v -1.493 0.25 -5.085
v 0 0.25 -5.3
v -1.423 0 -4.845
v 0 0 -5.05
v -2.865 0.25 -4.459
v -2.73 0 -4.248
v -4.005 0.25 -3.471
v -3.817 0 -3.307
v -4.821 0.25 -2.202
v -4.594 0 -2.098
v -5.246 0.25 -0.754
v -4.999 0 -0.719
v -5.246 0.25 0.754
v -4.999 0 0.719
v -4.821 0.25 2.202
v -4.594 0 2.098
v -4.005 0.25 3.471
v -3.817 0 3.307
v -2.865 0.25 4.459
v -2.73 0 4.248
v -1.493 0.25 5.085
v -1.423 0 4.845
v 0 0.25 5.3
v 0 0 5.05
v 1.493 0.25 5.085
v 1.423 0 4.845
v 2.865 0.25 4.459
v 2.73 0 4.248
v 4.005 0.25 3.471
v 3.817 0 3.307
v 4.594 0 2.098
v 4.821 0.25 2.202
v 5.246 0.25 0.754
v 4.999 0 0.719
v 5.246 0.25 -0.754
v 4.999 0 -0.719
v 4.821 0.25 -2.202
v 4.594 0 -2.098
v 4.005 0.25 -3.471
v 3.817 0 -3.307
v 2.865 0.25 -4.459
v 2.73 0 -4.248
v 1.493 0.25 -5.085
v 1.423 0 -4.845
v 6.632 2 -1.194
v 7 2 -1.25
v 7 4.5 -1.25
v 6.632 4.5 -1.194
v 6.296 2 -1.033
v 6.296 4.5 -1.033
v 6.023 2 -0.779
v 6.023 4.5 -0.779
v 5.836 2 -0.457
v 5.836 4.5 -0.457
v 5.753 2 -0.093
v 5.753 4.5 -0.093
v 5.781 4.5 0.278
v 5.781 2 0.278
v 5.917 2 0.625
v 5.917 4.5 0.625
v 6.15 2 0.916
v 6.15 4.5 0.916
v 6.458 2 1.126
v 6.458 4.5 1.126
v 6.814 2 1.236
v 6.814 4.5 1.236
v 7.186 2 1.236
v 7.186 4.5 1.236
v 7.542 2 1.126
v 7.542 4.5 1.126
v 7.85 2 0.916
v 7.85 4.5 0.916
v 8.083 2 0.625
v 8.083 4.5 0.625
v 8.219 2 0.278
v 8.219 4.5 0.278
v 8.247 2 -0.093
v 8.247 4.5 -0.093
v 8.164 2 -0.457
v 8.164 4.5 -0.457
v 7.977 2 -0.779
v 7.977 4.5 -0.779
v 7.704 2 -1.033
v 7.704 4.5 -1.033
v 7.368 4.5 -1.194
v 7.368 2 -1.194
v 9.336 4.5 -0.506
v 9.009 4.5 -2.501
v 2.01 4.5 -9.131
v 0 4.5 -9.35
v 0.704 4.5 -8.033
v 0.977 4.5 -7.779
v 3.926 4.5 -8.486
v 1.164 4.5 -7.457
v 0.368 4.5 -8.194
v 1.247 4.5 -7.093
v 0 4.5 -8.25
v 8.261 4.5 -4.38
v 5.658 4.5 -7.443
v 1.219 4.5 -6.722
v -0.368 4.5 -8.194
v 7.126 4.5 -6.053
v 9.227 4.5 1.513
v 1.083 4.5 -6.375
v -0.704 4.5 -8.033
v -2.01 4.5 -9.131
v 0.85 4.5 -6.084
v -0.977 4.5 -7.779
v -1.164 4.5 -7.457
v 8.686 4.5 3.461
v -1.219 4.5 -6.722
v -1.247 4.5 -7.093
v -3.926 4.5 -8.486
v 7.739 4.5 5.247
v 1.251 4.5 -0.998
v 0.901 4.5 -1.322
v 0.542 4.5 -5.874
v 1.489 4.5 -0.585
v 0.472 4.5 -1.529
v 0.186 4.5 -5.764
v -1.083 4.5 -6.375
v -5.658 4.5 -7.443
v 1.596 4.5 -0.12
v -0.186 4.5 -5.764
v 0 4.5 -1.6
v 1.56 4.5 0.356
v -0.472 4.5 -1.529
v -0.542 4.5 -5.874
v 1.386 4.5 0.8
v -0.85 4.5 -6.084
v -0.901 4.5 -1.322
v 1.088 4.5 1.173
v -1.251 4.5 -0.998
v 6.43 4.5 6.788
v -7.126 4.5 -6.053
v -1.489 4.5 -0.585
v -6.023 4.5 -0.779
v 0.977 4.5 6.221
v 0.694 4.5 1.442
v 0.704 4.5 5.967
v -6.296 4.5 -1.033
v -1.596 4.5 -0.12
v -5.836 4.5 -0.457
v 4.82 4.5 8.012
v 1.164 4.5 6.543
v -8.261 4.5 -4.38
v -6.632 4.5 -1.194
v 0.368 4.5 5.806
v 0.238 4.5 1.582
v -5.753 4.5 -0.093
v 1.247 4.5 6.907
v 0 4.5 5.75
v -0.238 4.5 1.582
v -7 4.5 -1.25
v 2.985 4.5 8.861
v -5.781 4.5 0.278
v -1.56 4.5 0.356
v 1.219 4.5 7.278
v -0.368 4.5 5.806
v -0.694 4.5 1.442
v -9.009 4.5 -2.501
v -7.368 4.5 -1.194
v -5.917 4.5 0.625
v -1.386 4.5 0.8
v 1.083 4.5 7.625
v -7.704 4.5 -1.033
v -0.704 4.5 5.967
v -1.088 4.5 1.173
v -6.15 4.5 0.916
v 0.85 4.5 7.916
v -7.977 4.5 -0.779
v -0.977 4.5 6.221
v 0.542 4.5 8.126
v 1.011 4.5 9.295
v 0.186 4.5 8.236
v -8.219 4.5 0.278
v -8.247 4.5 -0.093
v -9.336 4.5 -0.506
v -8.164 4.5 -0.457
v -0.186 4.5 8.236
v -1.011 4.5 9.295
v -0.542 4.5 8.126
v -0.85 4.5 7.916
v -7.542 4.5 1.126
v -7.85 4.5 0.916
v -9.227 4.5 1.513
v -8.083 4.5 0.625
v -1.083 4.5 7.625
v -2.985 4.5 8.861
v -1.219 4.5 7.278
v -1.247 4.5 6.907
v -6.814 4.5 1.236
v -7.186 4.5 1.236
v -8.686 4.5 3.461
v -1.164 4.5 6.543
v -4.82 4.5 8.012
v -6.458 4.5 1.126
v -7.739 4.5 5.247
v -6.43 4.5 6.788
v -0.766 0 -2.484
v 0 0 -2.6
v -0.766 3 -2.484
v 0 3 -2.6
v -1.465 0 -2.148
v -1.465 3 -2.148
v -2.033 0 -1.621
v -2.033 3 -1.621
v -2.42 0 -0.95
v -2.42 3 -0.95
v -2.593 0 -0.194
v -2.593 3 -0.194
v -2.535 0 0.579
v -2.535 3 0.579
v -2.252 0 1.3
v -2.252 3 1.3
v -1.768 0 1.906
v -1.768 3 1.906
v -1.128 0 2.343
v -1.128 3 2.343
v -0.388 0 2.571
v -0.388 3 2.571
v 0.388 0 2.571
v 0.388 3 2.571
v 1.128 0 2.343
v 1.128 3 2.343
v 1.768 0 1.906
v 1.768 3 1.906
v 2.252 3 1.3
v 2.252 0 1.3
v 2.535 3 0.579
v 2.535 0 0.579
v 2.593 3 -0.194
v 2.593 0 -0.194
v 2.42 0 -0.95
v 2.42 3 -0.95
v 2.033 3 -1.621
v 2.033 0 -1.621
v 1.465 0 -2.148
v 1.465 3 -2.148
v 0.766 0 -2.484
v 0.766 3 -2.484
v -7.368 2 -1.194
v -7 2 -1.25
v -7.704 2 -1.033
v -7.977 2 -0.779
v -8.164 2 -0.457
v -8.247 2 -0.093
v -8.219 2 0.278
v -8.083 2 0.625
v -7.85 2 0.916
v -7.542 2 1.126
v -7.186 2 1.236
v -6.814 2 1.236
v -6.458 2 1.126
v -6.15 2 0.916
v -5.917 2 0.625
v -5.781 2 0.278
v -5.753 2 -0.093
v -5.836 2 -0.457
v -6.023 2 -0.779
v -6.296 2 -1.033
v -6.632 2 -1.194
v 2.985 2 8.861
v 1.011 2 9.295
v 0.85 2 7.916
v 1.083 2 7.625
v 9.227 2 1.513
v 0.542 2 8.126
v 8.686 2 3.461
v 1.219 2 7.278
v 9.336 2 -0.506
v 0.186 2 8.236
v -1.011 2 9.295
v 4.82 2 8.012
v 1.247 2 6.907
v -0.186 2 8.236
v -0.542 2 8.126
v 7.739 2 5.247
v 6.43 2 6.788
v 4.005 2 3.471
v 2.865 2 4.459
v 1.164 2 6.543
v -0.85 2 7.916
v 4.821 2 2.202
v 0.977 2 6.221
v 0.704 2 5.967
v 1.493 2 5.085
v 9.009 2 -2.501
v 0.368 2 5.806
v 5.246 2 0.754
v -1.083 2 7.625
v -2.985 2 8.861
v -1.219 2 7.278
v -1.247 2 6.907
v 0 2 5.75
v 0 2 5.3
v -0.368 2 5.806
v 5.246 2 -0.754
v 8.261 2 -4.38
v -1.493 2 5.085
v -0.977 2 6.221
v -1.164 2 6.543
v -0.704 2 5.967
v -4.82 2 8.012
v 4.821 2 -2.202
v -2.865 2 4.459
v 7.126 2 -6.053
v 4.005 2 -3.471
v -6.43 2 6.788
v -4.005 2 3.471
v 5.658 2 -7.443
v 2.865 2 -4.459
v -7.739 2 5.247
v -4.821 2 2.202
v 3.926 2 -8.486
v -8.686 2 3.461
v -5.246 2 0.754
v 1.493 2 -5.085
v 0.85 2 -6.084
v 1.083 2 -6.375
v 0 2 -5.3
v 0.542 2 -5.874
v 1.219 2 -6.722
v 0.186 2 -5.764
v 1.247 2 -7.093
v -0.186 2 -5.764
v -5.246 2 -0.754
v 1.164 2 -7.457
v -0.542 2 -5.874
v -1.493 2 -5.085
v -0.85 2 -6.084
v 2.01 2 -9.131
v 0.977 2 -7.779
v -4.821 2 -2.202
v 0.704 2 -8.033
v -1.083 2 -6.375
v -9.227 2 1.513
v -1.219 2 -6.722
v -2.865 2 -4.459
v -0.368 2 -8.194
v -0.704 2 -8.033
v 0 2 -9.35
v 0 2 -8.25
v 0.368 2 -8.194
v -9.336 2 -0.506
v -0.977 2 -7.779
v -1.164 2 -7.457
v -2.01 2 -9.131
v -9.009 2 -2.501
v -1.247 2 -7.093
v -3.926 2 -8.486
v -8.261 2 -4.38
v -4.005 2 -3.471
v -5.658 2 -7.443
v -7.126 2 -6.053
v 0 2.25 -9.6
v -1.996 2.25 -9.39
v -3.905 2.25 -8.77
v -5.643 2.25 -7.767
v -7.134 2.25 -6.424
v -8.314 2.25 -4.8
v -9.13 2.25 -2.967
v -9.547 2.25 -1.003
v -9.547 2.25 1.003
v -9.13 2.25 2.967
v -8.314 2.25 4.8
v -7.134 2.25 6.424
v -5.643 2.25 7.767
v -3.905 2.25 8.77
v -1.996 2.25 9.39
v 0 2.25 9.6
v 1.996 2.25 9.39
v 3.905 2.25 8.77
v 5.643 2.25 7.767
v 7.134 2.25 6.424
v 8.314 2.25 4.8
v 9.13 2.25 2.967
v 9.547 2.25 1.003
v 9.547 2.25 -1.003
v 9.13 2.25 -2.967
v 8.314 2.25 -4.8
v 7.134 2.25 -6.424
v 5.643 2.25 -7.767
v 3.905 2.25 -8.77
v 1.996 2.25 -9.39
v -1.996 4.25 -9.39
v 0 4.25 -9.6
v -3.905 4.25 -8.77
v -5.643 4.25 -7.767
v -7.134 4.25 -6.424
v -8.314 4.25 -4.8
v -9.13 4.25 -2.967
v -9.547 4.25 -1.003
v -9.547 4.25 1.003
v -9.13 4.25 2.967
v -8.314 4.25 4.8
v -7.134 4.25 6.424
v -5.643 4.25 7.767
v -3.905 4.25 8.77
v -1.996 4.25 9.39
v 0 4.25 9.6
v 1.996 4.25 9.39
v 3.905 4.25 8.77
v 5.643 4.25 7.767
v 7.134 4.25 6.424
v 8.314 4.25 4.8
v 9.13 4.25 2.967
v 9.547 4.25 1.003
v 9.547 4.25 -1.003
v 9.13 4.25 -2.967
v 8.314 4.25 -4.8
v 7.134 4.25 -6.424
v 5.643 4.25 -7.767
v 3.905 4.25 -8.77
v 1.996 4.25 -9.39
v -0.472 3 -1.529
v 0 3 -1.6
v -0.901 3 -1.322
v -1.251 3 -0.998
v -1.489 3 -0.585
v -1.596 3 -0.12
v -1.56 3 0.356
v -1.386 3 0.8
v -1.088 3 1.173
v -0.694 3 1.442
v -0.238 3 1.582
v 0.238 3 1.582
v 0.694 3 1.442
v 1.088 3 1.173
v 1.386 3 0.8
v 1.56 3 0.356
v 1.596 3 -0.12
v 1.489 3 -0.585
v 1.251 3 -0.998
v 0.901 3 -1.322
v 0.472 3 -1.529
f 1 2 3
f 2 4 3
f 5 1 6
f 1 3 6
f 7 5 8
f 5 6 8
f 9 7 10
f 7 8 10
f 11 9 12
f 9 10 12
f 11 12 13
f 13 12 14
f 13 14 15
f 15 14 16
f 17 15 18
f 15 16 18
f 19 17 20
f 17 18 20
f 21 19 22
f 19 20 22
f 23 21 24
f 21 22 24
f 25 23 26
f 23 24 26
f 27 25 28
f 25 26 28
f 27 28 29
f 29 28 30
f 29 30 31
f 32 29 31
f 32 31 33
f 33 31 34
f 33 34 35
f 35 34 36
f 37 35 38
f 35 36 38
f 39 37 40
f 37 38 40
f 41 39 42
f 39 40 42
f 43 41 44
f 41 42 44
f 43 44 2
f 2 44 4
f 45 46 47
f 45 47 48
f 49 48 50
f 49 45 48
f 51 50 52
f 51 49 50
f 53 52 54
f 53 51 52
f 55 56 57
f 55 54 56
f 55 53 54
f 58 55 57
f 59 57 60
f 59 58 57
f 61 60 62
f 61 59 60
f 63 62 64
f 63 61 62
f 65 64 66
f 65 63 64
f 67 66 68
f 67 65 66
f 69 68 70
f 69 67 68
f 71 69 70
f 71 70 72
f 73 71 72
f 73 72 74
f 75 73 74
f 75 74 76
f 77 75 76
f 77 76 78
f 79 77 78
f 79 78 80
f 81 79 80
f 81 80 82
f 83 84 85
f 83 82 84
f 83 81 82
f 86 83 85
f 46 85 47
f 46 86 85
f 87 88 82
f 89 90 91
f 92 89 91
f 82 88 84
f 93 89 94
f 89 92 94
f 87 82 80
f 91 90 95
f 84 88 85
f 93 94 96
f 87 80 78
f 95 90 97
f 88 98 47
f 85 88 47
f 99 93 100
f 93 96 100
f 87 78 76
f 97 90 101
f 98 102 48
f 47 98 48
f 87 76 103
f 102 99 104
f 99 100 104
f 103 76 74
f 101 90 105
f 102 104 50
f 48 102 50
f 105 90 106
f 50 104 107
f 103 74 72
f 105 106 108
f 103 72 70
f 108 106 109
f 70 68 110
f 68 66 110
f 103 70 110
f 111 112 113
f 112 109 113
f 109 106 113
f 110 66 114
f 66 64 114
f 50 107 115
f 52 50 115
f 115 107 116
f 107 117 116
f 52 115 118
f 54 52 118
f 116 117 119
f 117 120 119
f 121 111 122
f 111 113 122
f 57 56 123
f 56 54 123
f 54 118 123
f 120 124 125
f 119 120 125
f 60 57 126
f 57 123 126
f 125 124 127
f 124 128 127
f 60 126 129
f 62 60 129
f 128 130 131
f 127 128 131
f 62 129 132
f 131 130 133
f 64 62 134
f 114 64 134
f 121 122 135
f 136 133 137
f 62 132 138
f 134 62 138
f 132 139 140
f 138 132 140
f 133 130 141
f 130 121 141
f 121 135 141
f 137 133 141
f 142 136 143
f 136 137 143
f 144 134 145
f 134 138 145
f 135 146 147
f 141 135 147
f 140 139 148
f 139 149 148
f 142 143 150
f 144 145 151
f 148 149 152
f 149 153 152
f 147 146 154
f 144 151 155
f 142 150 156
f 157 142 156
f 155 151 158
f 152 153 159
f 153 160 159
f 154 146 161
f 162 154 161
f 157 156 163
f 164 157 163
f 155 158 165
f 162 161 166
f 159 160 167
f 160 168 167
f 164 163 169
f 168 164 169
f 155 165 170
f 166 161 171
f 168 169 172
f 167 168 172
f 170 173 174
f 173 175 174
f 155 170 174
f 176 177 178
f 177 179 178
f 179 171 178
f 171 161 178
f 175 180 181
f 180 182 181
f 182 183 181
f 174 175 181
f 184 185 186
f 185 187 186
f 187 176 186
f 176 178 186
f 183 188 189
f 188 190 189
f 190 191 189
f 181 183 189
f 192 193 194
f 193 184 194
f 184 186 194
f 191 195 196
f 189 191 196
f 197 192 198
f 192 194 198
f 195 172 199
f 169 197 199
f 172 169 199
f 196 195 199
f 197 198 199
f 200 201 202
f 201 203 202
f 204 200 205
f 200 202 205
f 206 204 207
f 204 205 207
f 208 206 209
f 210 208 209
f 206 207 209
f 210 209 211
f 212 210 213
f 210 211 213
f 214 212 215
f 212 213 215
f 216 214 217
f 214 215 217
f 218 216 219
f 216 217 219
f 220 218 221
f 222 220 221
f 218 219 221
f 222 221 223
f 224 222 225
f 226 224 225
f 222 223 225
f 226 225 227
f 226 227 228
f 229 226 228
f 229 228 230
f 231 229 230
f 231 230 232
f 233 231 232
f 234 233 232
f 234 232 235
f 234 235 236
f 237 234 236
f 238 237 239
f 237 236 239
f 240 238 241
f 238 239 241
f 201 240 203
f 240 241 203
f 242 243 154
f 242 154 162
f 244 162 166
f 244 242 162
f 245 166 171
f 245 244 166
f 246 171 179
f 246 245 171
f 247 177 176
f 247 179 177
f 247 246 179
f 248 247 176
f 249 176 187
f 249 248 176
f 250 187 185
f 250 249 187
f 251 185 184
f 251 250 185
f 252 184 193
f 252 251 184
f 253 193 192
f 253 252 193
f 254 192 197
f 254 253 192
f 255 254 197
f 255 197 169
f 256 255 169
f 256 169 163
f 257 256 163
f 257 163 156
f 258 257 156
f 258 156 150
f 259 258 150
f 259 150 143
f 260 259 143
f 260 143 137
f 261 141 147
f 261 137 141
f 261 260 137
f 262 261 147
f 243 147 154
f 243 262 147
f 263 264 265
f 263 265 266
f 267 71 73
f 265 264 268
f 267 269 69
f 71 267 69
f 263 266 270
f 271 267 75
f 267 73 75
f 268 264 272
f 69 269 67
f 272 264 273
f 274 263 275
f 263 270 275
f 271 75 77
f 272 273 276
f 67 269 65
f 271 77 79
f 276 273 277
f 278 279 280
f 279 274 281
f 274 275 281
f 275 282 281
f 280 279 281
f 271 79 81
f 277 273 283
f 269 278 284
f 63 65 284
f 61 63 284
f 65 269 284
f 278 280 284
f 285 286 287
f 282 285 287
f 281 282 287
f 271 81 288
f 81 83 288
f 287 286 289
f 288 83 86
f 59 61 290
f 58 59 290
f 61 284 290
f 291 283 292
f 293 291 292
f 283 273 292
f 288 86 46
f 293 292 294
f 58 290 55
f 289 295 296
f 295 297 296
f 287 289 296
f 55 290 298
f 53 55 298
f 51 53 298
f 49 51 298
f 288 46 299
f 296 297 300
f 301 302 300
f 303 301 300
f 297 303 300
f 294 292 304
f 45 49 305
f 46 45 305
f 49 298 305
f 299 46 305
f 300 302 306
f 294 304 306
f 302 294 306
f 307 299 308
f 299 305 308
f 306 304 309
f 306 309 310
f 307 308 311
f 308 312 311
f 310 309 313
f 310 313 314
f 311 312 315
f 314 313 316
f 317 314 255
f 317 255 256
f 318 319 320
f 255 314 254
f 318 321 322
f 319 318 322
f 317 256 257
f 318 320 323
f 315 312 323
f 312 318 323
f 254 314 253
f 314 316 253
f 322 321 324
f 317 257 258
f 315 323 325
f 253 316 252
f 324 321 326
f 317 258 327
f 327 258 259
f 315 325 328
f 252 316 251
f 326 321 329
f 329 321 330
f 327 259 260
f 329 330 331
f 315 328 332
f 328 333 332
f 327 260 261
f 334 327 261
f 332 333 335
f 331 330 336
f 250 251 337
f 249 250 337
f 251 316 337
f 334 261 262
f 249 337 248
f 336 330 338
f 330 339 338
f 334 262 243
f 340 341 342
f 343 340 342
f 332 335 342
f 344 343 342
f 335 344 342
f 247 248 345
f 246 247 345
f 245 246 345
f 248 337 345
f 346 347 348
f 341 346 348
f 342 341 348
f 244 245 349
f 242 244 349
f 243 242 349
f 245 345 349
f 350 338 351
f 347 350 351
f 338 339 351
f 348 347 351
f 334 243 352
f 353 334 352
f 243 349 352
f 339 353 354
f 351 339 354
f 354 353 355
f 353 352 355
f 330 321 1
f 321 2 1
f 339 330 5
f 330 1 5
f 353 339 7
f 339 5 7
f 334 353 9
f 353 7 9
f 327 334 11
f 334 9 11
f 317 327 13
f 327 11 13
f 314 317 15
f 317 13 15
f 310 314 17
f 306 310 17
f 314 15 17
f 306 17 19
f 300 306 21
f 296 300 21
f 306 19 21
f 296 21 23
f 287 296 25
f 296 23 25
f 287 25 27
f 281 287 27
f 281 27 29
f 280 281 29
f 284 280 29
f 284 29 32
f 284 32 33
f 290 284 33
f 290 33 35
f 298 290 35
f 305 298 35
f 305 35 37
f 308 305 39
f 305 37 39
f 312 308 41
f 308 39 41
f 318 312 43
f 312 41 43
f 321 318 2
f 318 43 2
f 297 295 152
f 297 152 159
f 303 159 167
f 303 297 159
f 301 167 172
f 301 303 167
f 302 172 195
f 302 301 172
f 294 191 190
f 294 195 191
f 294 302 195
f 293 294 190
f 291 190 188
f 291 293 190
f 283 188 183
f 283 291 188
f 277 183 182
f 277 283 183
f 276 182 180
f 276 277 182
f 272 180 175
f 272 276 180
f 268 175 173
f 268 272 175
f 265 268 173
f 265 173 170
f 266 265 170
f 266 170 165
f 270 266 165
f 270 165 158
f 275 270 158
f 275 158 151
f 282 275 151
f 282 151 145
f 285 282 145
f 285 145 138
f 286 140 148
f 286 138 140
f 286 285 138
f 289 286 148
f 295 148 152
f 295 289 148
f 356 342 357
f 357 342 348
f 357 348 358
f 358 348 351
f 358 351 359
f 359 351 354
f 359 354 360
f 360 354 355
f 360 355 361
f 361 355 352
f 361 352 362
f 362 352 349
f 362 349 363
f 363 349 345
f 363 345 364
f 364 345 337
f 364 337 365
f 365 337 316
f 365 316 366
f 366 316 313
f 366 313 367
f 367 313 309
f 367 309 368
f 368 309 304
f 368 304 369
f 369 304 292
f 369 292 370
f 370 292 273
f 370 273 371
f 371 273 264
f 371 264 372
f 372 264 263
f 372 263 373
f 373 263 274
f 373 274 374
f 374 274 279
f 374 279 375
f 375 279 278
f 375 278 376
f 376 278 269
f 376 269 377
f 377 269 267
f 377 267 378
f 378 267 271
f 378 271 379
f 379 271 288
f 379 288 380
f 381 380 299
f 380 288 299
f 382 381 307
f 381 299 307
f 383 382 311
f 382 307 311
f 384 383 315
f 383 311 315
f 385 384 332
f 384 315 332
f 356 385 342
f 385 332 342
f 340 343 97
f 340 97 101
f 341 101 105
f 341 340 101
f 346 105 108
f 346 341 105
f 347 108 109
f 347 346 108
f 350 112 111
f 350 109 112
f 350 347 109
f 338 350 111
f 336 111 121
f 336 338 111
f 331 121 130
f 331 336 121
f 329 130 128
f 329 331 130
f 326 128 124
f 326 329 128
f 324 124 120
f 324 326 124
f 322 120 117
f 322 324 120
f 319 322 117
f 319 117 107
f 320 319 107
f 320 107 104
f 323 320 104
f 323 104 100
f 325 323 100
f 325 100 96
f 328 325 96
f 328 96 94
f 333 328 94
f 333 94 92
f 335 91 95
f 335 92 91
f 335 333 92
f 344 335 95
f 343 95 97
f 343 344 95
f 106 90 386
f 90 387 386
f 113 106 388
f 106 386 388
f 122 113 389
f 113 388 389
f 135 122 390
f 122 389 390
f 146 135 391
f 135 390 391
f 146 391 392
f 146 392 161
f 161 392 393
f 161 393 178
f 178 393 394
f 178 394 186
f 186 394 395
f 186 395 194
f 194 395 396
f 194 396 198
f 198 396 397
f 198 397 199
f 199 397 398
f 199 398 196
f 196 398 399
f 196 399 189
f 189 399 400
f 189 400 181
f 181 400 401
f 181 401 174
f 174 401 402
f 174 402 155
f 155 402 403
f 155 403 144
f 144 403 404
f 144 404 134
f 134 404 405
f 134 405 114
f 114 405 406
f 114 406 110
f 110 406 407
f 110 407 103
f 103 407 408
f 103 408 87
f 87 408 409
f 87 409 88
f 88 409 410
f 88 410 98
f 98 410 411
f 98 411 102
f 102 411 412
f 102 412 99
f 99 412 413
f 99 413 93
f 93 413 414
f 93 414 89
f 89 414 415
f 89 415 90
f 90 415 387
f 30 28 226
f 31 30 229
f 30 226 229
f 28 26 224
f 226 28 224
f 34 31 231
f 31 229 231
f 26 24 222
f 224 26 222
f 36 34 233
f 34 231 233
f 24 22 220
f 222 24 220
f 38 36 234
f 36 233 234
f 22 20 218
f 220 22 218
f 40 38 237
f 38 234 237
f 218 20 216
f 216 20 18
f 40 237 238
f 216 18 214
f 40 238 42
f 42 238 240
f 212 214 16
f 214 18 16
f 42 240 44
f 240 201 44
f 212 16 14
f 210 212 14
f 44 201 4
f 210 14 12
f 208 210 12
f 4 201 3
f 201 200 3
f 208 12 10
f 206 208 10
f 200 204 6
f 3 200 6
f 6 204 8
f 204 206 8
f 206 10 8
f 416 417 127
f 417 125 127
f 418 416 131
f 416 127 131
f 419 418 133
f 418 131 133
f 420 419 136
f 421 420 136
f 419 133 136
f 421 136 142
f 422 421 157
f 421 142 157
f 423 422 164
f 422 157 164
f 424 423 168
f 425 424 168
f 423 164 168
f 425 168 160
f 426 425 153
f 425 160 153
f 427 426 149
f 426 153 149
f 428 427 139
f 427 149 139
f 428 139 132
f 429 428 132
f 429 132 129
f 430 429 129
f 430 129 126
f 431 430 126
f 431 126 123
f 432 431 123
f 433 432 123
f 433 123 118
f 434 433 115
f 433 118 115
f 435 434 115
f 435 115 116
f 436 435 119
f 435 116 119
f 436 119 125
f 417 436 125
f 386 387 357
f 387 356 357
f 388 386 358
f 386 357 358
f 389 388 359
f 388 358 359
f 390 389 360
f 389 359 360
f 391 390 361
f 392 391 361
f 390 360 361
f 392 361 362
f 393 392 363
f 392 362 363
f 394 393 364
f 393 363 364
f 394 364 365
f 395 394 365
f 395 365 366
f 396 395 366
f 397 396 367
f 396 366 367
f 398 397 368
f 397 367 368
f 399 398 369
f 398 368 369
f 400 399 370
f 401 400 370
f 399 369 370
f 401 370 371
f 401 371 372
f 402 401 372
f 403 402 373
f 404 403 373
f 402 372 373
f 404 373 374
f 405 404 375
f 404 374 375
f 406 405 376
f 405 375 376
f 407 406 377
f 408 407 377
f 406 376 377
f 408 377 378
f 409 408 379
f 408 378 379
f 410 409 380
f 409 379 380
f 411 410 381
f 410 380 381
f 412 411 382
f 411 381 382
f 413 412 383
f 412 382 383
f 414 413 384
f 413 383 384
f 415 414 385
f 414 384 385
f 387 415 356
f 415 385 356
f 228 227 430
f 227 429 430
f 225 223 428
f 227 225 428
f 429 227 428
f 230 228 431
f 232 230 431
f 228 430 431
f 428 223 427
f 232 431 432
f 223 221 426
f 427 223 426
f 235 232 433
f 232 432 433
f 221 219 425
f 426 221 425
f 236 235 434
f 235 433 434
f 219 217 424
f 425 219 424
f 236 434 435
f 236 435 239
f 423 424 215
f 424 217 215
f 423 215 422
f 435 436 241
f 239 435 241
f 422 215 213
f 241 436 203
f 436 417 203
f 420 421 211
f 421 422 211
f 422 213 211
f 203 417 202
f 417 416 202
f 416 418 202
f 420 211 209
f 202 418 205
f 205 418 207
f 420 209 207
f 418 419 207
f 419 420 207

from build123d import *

# Parameters (mm, degrees)
SKETCH2_R          = 1.25
CUT_EXTRUDE1_DEPTH = 15.302796929


with BuildPart() as part:
    # Sketch1 → Revolve1 (revolve)
    with BuildSketch(Plane.XY, mode=Mode.PRIVATE) as revolve1_sk:
        Polygon((1.6, 3), (1.6, 4.5), (9.35, 4.5), (9.6, 4.25), (9.6, 2.25), (9.35, 2), (5.3, 2), (5.3, 0.25), (5.05, 0), (2.6, 0), (2.6, 3), align=None)
    revolve(revolve1_sk.sketch.rotate(Axis((0, 0, 0), (0, 1, 0)), 90), axis=Axis((0, 0, 0), (0, 1, 0)))

    # Sketch2 → Cut-Extrude1 (cut, through all)
    with BuildSketch(Plane(origin=(0, 0, 0), x_dir=(1, 0, 0), z_dir=(0, 1, 0))):
        with Locations(Location((0, 7, 0), (0, 0, 90))):
            Circle(SKETCH2_R)
        with Locations(Location((0, -7, 0), (0, 0, 90))):
            Circle(SKETCH2_R)
        with Locations(Location((7, 0, 0), (0, 0, 90))):
            Circle(SKETCH2_R)
        with Locations(Location((-7, 0, 0), (0, 0, 90))):
            Circle(SKETCH2_R)
    extrude(amount=CUT_EXTRUDE1_DEPTH, mode=Mode.SUBTRACT)


solid = part.part
